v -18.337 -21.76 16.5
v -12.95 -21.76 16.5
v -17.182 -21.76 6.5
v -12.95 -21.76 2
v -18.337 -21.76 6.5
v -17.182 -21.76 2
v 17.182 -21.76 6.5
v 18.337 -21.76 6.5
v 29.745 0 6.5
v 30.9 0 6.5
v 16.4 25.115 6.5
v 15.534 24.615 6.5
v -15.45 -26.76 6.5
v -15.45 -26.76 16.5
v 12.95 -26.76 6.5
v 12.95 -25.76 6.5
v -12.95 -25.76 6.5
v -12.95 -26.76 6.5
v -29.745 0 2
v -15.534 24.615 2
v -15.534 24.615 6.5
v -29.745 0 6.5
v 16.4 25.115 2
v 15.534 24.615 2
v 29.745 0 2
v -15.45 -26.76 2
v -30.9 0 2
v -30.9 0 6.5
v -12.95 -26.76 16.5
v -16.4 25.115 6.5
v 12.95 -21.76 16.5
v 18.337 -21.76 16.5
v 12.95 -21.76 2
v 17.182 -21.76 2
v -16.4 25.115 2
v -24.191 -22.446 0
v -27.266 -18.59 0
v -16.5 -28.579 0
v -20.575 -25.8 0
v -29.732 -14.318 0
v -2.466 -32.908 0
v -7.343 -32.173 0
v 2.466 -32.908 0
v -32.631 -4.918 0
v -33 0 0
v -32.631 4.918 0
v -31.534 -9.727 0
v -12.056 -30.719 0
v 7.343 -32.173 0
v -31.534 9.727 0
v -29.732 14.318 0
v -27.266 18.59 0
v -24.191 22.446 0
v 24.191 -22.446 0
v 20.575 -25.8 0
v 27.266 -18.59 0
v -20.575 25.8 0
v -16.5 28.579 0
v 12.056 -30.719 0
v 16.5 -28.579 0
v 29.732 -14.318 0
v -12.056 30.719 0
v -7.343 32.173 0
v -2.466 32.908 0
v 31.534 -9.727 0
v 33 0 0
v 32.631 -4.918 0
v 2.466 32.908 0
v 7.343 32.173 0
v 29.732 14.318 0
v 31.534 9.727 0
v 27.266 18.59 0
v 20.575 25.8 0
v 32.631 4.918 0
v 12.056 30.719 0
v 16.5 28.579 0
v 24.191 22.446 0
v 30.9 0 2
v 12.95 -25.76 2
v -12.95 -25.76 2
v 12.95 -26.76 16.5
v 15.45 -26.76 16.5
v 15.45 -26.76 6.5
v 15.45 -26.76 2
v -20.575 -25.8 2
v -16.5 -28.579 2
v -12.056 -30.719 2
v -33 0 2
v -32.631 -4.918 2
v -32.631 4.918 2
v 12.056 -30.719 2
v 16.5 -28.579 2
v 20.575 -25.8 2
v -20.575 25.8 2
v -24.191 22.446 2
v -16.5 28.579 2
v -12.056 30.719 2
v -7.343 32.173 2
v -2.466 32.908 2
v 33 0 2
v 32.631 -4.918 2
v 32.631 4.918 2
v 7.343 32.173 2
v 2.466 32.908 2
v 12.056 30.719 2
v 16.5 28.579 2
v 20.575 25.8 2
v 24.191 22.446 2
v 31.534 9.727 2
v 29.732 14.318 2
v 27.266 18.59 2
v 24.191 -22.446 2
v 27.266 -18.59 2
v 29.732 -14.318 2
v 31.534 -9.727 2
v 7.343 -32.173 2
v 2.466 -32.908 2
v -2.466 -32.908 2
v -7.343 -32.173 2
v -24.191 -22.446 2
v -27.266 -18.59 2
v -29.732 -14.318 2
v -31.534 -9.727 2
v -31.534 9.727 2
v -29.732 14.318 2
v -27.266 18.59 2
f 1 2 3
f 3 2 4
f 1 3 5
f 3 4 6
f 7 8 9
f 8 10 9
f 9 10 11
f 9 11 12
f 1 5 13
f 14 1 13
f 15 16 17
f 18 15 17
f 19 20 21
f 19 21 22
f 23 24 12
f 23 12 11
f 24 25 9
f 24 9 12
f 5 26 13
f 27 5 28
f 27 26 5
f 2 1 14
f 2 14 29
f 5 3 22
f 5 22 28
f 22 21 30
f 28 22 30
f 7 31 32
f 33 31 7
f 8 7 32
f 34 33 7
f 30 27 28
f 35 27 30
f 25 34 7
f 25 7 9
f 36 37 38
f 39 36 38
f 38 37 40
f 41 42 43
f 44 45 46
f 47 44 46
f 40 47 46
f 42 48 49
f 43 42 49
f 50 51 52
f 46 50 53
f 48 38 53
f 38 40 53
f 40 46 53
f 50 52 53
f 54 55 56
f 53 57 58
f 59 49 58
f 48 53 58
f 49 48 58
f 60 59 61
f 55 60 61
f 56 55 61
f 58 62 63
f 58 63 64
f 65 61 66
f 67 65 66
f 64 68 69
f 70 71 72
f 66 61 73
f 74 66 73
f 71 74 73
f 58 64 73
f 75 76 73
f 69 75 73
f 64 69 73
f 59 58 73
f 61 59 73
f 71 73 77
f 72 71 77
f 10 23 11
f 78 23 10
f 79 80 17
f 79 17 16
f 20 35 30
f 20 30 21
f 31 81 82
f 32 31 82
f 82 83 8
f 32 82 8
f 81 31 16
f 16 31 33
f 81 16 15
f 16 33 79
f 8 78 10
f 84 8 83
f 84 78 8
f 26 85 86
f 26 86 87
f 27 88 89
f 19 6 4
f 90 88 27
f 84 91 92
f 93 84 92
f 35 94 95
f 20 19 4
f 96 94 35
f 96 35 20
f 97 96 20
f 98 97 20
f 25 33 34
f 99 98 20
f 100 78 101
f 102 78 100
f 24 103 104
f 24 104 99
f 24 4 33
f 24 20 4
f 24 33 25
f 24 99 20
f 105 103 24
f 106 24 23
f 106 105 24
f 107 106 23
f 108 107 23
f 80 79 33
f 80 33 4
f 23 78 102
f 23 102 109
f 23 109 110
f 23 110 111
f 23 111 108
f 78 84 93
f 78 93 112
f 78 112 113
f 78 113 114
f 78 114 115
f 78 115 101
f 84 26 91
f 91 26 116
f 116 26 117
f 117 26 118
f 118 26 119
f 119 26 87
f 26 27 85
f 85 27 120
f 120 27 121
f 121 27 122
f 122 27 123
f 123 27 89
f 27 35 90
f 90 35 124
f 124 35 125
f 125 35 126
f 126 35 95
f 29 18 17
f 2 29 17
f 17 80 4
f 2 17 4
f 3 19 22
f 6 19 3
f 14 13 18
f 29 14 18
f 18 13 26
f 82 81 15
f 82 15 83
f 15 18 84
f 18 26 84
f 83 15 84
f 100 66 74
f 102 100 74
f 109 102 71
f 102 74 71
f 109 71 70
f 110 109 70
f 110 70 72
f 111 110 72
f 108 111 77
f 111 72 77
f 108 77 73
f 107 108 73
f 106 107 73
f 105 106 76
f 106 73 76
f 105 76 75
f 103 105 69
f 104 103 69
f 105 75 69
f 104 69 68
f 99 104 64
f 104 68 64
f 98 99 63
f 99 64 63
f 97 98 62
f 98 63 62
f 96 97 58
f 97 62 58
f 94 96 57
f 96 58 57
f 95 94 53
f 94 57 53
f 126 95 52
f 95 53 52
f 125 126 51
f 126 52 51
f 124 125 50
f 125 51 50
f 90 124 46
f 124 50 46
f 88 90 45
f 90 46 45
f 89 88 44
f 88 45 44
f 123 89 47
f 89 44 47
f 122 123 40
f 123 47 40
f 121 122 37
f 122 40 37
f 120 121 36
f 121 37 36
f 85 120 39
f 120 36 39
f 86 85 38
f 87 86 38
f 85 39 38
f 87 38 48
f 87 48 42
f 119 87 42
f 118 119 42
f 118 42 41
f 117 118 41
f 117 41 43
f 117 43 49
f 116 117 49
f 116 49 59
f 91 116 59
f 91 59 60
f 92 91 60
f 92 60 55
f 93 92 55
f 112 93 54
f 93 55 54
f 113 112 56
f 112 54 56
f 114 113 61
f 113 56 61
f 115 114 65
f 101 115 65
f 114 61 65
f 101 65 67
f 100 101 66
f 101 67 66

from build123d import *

# Parameters (mm, degrees)
SKETCH1_R           = 33
BOSS_EXTRUDE1_DEPTH = 2
BOSS_EXTRUDE2_DEPTH = 4.5
BOSS_EXTRUDE3_DEPTH = 10


with BuildPart() as part:
    # Sketch1 → Boss-Extrude1 (new body)
    with BuildSketch(Plane.XY):
        Circle(SKETCH1_R)
    extrude(amount=BOSS_EXTRUDE1_DEPTH)

    # Sketch3 → Boss-Extrude2 (add)
    with BuildSketch(Plane.XY.offset(2)):
        Polygon((-15.533974596, 24.61473671), (-29.745299462, 0), (-17.182050808, -21.760184977), (-12.95, -21.760184977), (-12.95, -25.760184977), (12.95, -25.760184977), (12.95, -21.760184977), (17.182050808, -21.760184977), (29.745299462, 0), (15.533974596, 24.61473671), (16.4, 25.11473671), (30.9, 0), (15.45, -26.760184977), (-15.45, -26.760184977), (-30.9, 0), (-16.4, 25.11473671), align=None)
    extrude(amount=BOSS_EXTRUDE2_DEPTH)

    # Sketch4 → Boss-Extrude3 (add)
    with BuildSketch(Plane.XY.offset(6.5)):
        Polygon((-12.95, -21.760184977), (-18.336751346, -21.760184977), (-15.45, -26.760184977), (-12.95, -26.760184977), align=None)
        Polygon((12.95, -21.760184977), (12.95, -26.760184977), (15.45, -26.760184977), (18.336751346, -21.760184977), align=None)
    extrude(amount=BOSS_EXTRUDE3_DEPTH)


solid = part.part
